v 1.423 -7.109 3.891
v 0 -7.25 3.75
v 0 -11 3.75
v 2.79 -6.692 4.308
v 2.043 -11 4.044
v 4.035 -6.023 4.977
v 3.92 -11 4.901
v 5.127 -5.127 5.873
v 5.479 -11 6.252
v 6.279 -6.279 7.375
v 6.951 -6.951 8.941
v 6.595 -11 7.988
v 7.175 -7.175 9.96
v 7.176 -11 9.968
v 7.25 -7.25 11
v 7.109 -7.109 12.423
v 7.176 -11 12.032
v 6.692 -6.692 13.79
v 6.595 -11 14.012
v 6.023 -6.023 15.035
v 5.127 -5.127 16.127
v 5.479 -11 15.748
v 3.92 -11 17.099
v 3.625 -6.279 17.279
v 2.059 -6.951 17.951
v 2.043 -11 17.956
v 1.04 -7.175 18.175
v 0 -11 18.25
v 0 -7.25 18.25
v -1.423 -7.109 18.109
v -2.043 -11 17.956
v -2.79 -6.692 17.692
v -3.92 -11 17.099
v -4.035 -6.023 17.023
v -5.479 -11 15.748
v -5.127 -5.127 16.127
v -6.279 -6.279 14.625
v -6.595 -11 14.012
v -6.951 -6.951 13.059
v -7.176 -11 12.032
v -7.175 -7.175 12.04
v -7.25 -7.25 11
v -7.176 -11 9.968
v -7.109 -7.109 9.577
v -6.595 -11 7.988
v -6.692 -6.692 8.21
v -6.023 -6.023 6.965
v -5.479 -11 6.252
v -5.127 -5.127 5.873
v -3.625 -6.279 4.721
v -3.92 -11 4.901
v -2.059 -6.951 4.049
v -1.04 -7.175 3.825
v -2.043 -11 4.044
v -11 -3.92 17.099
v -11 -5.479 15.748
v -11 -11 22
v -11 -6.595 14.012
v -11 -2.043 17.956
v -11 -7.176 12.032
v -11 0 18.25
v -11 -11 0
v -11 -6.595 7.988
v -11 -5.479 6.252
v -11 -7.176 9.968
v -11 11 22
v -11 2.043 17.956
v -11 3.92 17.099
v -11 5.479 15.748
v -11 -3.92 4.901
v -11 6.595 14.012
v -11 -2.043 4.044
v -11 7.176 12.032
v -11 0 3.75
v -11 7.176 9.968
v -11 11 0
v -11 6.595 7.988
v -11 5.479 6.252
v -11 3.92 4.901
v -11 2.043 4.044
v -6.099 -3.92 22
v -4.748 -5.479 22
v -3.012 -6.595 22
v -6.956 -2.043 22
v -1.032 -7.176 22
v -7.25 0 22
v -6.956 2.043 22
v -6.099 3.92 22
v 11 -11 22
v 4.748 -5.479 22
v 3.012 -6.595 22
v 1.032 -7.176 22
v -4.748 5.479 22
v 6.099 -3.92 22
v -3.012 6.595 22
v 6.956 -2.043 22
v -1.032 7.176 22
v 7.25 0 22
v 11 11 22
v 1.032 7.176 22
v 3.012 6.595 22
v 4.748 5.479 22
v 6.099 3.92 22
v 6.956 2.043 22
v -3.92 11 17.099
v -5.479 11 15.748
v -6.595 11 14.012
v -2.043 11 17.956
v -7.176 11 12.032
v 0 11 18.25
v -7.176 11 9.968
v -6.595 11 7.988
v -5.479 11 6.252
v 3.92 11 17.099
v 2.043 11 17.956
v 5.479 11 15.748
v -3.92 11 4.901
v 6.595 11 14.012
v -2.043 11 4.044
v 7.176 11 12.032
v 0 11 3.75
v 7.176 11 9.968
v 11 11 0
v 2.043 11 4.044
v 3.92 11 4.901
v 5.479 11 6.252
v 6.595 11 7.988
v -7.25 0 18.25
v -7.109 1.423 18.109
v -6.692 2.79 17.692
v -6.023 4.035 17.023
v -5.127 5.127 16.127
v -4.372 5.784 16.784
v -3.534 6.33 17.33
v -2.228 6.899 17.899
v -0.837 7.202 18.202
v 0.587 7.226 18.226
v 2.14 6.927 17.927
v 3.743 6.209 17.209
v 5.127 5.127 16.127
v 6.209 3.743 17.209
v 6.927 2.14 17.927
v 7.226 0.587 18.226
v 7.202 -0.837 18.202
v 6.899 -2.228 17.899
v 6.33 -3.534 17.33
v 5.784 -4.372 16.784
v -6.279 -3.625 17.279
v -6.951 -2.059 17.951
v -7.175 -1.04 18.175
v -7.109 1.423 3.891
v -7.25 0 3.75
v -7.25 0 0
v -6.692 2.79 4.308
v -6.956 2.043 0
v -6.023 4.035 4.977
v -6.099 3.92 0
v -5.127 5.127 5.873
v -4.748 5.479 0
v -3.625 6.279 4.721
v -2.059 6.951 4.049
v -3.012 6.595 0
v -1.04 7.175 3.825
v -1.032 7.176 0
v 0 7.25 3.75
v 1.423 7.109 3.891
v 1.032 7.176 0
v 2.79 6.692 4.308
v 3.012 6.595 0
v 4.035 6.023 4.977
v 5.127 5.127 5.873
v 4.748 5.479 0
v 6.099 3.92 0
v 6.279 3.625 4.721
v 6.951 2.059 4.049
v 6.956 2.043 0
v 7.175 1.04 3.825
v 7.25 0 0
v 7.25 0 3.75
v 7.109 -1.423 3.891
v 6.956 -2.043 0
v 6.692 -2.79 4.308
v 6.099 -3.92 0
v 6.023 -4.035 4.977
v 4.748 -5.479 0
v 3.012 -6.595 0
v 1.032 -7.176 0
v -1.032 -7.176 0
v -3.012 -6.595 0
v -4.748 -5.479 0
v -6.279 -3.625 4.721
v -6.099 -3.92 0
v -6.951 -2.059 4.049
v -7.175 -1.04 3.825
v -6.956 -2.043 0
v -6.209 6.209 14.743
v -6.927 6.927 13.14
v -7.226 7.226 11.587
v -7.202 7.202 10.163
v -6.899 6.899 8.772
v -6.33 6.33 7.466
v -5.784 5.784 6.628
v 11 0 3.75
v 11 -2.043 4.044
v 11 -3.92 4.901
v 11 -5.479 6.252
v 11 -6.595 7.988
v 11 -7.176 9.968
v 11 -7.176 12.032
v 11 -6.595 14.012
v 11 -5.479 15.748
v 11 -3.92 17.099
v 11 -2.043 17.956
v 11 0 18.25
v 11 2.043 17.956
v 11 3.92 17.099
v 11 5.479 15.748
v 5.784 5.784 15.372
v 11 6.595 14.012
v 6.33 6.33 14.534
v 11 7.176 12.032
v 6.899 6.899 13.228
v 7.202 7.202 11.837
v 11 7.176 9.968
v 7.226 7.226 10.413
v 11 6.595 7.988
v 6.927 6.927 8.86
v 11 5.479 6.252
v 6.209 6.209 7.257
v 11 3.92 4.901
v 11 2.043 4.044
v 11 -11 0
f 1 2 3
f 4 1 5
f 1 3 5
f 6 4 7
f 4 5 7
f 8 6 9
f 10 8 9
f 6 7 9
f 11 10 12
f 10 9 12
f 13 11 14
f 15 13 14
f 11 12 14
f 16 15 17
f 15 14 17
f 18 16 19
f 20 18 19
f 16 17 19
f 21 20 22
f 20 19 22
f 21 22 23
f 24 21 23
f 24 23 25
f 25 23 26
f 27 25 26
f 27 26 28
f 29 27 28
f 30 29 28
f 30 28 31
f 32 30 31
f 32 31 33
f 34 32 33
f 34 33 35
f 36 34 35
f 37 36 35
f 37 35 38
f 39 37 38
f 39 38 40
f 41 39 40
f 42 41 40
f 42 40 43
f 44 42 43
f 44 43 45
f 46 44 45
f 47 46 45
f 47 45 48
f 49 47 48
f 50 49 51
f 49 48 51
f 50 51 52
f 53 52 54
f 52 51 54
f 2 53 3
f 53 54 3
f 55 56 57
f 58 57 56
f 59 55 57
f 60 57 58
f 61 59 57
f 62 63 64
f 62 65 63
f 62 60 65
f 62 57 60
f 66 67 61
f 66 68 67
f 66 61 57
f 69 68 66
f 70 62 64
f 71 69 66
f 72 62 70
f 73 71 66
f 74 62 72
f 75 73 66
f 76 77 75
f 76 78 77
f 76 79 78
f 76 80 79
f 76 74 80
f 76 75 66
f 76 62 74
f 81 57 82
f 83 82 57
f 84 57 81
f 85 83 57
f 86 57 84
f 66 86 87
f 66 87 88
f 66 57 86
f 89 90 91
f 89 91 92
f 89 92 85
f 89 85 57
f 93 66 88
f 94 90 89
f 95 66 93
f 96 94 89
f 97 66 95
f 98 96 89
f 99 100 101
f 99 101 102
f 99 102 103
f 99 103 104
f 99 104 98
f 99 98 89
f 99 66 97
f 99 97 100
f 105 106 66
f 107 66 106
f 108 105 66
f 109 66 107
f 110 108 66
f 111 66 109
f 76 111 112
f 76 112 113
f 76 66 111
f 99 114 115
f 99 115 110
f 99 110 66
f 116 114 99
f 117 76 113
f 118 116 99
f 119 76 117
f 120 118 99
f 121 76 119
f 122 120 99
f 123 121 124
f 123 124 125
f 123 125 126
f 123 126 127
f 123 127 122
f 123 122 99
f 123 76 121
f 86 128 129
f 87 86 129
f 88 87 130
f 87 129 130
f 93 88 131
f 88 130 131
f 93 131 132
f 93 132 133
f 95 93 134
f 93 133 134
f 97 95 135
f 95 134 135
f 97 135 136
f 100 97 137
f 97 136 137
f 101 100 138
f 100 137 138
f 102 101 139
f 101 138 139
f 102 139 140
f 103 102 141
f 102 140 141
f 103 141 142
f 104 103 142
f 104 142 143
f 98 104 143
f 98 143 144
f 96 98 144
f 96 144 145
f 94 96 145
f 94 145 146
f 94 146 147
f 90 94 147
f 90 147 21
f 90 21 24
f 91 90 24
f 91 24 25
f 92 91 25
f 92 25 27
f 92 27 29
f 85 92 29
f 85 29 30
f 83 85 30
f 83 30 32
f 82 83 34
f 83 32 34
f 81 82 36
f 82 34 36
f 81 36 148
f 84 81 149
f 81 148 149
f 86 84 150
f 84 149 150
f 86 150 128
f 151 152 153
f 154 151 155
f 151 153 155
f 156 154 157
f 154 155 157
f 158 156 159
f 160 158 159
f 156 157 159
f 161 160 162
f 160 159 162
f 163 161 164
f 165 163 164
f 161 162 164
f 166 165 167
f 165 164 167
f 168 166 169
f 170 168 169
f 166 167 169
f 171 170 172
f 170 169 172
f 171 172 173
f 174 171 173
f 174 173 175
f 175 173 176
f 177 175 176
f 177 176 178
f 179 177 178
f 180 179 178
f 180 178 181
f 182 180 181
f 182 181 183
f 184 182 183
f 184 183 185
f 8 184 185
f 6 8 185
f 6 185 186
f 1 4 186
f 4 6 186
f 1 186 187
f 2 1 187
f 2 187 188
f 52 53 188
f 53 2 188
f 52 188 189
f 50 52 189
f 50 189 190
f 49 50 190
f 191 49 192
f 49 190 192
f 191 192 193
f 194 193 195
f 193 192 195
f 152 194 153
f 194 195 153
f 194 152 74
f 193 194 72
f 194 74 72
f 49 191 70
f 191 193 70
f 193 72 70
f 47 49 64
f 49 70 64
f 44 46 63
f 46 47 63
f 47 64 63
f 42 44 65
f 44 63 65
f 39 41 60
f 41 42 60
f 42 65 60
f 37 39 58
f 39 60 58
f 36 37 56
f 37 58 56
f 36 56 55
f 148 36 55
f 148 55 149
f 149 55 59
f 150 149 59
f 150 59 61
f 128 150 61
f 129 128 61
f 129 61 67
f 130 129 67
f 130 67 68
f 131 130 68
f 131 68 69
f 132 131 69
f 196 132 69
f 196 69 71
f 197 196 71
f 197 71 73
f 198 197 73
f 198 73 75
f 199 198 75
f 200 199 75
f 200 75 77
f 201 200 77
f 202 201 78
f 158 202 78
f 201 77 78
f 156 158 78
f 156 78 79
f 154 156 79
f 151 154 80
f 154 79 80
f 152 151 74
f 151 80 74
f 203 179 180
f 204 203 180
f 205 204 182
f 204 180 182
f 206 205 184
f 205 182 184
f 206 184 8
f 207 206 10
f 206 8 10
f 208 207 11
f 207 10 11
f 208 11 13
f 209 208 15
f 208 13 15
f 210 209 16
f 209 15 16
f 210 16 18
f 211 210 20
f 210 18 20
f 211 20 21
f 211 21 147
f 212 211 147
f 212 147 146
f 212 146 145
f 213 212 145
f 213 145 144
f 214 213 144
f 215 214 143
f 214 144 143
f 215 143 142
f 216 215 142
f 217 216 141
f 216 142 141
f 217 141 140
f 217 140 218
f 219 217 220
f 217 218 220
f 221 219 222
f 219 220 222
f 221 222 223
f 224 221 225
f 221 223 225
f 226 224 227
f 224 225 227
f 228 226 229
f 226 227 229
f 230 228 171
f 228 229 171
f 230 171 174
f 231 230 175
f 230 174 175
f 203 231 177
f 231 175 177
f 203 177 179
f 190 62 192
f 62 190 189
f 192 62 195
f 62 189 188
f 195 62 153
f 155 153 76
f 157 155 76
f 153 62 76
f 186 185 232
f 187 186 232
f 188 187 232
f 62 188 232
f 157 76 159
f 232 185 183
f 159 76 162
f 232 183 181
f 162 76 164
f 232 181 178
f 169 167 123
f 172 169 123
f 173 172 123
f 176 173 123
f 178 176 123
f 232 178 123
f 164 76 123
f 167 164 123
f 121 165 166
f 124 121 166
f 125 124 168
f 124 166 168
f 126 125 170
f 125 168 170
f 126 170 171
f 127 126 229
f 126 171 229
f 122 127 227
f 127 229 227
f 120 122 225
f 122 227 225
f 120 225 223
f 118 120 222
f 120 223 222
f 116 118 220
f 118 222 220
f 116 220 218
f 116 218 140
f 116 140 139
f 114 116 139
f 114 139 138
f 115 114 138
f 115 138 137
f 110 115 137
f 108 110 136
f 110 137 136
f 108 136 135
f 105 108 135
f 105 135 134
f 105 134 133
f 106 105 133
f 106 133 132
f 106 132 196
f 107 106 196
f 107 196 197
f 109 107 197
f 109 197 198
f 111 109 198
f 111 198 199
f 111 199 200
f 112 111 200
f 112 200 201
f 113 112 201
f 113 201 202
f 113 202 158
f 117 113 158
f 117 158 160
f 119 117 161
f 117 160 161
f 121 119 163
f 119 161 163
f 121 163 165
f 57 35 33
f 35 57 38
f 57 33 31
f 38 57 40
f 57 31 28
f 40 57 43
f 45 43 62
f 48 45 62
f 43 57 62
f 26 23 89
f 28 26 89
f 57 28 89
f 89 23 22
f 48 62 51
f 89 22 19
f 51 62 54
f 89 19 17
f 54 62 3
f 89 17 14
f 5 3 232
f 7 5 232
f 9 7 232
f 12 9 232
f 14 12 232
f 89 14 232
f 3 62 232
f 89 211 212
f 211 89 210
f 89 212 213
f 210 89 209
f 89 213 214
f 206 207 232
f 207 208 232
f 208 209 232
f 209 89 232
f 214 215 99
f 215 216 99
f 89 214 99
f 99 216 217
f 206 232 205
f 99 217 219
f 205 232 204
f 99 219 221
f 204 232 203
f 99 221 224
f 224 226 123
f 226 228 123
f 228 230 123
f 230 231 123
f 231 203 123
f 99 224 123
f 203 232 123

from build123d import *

# Parameters (mm, degrees)
ESQUISSE1_W                 = 22
ESQUISSE1_H                 = 22
BOSS_EXTRU_1_DEPTH          = 22
D_GAGEMENT_M131_D           = 14.5
D_GAGEMENT_M131_ON_FACE_2_D = 14.5
D_GAGEMENT_M131_ON_FACE_3_D = 14.5


with BuildPart() as part:
    # Esquisse1 → Boss.-Extru.1 (new body)
    with BuildSketch(Plane.XY):
        Rectangle(ESQUISSE1_W, ESQUISSE1_H)
    extrude(amount=BOSS_EXTRU_1_DEPTH)

    # Dégagement M131 (through all)
    with Locations(Plane(origin=(0, 11, 11), x_dir=(0, 0, 1), z_dir=(0, 1, 0))):
        with Locations((0, 0)):
            Hole(D_GAGEMENT_M131_D / 2)

    # Dégagement M131 on face 2 (through all)
    with Locations(Plane.XY.offset(22)):
        with Locations((0, 0)):
            Hole(D_GAGEMENT_M131_ON_FACE_2_D / 2)

    # Dégagement M131 on face 3 (through all)
    with Locations(Plane(origin=(11, 0, 11), x_dir=(0, 0, 1), z_dir=(1, 0, 0))):
        with Locations((0, 0)):
            Hole(D_GAGEMENT_M131_ON_FACE_3_D / 2)


solid = part.part
